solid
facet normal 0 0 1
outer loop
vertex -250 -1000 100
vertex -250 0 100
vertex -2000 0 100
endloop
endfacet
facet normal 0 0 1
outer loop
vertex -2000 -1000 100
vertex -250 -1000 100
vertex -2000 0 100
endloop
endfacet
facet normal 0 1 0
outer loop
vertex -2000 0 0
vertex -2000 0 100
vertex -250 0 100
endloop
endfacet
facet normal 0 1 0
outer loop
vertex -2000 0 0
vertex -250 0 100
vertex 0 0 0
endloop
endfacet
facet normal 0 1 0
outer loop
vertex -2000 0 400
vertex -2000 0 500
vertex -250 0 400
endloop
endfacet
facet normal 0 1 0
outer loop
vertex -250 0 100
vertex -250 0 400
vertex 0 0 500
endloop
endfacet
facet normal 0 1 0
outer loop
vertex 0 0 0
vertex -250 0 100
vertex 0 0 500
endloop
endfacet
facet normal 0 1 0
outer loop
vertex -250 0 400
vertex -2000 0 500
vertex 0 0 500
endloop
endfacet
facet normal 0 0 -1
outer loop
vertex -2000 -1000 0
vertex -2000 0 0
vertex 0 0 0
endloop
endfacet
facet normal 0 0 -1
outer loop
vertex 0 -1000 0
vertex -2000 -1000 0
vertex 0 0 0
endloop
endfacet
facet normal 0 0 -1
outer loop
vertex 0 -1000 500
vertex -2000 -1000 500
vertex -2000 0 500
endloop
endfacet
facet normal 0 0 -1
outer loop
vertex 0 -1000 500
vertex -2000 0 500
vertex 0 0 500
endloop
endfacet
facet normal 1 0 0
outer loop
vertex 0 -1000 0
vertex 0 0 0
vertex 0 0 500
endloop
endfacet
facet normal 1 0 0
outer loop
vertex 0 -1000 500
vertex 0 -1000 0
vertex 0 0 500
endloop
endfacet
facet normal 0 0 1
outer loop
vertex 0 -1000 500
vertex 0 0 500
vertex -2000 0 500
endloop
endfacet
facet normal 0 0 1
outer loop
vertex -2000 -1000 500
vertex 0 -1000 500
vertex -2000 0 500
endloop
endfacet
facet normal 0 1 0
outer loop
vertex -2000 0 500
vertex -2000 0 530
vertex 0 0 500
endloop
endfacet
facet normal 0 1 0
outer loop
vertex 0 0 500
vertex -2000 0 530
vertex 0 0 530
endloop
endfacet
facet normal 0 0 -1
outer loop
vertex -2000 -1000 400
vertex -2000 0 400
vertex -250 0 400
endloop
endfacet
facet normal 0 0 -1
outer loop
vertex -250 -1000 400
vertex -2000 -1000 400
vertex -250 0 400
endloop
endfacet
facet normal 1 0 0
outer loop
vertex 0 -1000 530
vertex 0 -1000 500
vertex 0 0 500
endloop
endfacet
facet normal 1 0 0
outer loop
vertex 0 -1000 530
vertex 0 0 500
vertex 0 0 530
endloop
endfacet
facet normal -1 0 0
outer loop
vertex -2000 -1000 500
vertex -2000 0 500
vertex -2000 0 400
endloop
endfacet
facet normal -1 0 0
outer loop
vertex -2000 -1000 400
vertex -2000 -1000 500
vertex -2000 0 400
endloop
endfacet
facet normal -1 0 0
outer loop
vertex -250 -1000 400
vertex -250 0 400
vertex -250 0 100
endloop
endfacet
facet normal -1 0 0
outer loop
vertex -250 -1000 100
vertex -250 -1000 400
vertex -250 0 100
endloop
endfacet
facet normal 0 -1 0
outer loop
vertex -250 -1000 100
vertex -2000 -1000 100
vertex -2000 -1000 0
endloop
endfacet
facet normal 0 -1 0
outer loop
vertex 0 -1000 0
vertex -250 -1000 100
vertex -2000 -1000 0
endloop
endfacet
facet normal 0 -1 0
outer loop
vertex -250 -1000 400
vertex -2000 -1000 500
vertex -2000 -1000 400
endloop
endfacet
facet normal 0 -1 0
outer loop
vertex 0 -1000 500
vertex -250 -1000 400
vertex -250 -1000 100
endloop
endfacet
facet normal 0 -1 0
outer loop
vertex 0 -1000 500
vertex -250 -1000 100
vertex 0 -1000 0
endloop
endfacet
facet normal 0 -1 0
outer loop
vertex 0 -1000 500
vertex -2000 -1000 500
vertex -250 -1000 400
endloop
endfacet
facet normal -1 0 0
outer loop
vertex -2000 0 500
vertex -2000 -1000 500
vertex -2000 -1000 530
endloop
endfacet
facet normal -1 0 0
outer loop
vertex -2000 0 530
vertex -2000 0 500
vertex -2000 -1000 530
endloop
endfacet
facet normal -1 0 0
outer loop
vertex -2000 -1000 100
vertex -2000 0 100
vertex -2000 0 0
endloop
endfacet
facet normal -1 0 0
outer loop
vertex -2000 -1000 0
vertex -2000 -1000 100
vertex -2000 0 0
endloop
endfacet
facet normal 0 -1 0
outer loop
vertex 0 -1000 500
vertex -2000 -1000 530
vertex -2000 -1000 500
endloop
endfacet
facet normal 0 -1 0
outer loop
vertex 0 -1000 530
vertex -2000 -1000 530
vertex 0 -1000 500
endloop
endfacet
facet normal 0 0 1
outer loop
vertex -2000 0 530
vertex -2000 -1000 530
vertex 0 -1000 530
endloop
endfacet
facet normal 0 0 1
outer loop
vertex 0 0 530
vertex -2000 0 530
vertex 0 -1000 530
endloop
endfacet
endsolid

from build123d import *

# Parameters (mm, degrees)
F1_DEPTH = 1000
F3_W     = 2000
F3_H     = 30
F4_DEPTH = 1000


# Not quite as in the source:
# - a feature names something its author has since deleted; it is built from what else it names


with BuildPart() as f1:
    # F0 (on Front) → F1 (new body)
    with BuildSketch(Plane.XZ):
        Polygon((-2000, 0), (0, 0), (0, 500), (-2000, 500), (-2000, 400), (-250, 400), (-250, 100), (-2000, 100), align=None)
    extrude(amount=F1_DEPTH)


with BuildPart() as f4:
    # F3 (on face) → F4 (new body)
    with BuildSketch(Plane.XZ.offset(1000)):
        with Locations((-1000, 515)):
            Rectangle(F3_W, F3_H)
    extrude(amount=-F4_DEPTH)


solid = Compound([f1.part, f4.part])
